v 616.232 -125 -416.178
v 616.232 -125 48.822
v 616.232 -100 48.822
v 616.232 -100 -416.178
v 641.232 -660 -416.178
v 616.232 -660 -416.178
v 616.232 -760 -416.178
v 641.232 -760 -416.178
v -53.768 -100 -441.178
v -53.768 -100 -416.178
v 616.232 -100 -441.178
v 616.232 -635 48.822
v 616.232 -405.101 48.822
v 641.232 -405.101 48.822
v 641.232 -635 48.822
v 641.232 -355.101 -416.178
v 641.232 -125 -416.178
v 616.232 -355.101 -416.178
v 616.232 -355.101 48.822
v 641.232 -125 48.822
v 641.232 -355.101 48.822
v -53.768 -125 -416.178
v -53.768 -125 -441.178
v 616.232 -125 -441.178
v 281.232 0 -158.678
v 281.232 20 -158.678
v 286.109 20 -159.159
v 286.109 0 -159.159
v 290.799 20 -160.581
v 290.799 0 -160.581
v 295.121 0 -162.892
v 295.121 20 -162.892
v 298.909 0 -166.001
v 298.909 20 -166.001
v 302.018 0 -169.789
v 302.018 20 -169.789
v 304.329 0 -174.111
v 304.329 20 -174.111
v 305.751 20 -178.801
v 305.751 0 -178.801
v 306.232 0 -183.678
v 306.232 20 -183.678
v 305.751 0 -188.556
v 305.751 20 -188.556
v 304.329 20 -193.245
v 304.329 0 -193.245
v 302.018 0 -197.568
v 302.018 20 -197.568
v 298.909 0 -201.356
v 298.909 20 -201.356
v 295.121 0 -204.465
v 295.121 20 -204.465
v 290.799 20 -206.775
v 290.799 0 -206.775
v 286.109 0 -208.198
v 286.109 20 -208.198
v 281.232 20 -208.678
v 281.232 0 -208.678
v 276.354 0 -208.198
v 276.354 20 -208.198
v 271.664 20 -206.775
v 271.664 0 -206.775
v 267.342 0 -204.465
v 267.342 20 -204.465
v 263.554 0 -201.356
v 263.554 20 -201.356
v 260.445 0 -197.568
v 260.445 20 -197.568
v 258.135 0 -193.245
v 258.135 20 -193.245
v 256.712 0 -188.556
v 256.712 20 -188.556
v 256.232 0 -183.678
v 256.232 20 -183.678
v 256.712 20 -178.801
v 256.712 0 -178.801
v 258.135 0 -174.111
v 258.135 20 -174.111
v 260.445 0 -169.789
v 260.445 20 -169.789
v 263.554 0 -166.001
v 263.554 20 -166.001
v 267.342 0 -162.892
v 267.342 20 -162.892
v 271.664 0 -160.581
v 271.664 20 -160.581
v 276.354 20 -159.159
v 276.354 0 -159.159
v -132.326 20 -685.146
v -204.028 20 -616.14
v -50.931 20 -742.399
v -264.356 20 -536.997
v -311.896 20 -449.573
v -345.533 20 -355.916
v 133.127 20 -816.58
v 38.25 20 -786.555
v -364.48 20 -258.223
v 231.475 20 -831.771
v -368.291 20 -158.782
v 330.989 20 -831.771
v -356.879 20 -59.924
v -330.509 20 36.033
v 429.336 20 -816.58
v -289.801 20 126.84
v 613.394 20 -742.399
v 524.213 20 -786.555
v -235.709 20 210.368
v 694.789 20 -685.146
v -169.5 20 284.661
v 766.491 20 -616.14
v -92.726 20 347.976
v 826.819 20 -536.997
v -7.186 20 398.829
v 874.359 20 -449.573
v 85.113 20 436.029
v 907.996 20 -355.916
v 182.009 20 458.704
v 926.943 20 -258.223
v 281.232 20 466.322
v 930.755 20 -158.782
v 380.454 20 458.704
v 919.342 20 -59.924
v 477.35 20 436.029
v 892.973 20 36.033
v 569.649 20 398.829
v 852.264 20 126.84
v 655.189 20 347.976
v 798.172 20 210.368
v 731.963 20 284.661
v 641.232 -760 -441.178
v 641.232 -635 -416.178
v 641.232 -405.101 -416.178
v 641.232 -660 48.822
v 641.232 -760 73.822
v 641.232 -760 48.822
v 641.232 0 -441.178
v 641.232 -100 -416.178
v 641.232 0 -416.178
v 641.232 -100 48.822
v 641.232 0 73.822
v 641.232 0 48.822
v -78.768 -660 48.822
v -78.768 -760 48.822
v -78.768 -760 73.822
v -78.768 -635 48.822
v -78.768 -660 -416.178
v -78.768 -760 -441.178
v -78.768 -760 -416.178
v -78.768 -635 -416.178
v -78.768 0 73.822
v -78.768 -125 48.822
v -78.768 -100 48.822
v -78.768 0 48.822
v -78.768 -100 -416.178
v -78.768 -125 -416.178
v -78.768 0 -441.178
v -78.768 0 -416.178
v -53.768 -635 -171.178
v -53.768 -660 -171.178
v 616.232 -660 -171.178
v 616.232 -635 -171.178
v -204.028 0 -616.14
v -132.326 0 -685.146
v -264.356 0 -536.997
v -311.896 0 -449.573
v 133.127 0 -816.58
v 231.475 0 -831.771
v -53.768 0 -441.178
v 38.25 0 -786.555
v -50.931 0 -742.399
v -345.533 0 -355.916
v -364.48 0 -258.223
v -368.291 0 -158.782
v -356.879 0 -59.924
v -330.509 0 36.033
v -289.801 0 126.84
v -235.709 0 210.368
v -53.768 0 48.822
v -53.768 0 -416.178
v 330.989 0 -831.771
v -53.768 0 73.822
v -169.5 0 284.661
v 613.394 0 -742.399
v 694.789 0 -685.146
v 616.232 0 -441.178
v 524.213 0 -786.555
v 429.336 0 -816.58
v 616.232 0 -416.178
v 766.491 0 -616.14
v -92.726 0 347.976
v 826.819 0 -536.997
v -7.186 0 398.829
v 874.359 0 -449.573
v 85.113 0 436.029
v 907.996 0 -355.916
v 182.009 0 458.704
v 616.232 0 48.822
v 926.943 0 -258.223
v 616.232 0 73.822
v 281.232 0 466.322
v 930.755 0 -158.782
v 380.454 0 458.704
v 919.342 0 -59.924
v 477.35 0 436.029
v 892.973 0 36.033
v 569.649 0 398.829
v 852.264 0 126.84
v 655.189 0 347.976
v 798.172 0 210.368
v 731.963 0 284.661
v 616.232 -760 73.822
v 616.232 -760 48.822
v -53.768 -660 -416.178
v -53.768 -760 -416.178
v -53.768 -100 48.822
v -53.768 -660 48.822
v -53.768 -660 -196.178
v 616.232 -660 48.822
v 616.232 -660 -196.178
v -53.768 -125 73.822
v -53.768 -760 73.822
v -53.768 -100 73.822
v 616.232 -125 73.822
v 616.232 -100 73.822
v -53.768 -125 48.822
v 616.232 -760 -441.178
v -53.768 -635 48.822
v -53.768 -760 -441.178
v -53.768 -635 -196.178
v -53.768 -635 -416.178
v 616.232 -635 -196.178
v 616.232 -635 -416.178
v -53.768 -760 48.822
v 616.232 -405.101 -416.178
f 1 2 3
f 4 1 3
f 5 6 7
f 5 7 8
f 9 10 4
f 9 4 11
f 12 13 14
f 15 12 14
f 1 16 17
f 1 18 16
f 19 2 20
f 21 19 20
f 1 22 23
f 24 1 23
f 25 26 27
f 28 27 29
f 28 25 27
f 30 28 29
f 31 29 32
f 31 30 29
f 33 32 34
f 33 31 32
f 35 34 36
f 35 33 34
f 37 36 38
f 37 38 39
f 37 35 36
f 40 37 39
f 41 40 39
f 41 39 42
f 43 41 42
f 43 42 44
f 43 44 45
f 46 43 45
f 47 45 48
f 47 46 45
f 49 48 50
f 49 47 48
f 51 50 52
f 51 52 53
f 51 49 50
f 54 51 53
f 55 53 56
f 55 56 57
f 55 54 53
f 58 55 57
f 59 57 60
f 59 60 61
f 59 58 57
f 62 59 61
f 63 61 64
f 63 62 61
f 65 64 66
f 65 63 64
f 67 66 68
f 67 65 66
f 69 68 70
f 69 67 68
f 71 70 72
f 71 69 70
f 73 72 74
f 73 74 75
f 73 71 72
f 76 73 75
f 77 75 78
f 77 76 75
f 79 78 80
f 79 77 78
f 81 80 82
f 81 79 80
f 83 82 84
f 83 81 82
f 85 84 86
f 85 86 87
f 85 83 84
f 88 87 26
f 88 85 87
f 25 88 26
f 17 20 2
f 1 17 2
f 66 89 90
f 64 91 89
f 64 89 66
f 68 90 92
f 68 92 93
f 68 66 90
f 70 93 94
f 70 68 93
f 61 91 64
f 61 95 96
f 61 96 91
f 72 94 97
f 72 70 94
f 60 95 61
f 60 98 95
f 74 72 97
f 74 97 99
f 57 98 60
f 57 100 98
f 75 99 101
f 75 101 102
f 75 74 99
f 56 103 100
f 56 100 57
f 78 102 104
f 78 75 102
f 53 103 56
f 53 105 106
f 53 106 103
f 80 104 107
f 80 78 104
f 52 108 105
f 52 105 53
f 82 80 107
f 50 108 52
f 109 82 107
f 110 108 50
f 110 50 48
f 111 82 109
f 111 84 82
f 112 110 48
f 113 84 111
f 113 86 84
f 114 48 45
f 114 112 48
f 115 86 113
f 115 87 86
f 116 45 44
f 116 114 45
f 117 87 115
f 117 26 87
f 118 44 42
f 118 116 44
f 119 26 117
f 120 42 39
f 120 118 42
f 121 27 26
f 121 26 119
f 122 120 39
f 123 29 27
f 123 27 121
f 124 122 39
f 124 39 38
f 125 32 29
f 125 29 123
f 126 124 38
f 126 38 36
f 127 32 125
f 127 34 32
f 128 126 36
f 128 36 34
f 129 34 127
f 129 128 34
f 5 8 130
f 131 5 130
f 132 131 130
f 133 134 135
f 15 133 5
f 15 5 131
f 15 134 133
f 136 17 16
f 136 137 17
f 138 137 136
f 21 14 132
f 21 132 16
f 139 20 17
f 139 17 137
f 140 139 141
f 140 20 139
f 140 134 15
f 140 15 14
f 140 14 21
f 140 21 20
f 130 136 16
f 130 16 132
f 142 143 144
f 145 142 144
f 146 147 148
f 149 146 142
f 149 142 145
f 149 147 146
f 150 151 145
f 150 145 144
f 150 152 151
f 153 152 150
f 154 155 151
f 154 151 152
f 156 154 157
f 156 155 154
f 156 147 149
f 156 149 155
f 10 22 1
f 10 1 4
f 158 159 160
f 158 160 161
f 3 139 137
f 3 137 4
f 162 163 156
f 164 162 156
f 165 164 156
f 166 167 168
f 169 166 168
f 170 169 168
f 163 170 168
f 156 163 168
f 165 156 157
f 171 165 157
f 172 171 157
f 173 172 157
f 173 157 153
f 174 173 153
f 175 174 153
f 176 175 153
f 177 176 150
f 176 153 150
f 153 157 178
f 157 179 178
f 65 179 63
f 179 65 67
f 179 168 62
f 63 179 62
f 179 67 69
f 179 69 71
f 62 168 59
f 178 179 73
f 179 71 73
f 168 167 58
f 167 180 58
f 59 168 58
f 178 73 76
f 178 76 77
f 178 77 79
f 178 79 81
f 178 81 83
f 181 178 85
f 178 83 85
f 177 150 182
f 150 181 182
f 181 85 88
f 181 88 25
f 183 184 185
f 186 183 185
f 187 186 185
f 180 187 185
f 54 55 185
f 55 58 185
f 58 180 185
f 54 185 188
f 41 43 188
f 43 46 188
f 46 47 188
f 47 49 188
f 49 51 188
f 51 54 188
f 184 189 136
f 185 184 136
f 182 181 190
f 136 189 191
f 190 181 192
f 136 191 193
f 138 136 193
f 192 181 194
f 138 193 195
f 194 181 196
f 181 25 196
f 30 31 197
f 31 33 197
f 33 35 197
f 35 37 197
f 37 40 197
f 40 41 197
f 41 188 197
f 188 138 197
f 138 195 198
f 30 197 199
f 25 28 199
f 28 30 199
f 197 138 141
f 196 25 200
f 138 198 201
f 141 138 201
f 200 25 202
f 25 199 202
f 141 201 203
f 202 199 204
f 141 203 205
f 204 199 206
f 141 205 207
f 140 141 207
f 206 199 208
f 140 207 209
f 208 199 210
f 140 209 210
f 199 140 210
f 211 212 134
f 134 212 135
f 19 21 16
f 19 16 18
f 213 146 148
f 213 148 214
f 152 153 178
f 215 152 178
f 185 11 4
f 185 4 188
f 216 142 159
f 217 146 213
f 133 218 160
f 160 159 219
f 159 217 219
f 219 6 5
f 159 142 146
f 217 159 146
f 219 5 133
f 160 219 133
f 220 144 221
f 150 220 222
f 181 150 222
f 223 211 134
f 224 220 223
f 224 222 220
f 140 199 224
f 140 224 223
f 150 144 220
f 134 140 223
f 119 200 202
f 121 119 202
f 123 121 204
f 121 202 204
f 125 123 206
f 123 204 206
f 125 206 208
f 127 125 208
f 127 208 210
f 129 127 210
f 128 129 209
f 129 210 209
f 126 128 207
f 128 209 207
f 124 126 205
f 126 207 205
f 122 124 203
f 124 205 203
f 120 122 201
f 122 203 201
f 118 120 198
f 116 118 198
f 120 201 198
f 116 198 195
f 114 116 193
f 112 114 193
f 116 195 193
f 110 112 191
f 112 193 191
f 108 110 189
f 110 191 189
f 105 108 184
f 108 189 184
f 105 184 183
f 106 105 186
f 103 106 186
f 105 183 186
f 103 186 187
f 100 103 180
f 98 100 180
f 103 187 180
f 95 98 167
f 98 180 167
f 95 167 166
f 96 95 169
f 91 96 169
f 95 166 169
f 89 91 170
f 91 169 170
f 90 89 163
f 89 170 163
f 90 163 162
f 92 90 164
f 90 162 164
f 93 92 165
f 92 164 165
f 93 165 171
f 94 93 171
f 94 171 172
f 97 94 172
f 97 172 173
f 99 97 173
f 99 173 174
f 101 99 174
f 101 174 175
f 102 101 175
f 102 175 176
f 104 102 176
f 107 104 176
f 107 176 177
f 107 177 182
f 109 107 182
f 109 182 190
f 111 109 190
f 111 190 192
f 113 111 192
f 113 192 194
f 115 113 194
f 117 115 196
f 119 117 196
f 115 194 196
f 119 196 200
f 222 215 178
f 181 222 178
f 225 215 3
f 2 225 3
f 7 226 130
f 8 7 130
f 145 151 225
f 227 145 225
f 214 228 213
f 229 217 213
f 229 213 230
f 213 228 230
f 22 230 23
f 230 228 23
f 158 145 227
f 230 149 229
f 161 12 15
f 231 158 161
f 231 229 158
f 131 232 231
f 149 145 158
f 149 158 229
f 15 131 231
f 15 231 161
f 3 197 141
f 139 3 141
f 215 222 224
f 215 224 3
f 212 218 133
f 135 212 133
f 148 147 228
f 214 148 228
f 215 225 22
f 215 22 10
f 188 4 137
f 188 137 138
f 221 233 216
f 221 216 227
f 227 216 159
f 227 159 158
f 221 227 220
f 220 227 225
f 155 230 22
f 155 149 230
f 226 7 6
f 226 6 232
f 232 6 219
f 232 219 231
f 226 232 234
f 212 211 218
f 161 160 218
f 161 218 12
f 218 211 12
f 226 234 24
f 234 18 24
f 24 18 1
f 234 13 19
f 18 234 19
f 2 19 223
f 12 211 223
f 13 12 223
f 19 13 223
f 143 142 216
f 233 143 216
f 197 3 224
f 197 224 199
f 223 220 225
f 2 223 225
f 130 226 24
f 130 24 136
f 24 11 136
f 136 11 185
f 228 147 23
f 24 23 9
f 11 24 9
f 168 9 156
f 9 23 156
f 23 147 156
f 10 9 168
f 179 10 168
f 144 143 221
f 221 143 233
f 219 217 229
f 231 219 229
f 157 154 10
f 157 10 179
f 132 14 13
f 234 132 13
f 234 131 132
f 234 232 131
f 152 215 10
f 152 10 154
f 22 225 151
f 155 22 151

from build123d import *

# Parameters (mm, degrees)
SKETCH2_W             = 25
SKETCH2_H             = 25
BOSS_EXTRUDE1_DEPTH   = 760
BOSS_EXTRUDE1_2_DEPTH = 760
BOSS_EXTRUDE1_3_DEPTH = 760
BOSS_EXTRUDE1_4_DEPTH = 760
SKETCH3_W             = 25
SKETCH3_H             = 25
BOSS_EXTRUDE2_DEPTH   = 470
SKETCH6_W             = 25
SKETCH6_H             = 25
BOSS_EXTRUDE4_DEPTH   = 675
SKETCH10_W            = 25
SKETCH10_H            = 25
BOSS_EXTRUDE5_DEPTH   = 470
SKETCH11_W            = 25
SKETCH11_H            = 50
BOSS_EXTRUDE6_DEPTH   = 470
SKETCH12_R            = 650
BOSS_EXTRUDE7_DEPTH   = 20
SKETCH13_R            = 25
CUT_EXTRUDE3_DEPTH    = 20


with BuildPart() as part:
    # Sketch2 → Boss-Extrude1 (new body)
    with BuildSketch(Plane(origin=(0, 0, 0), x_dir=(1, 0, 0), z_dir=(0, 1, 0))):
        with Locations((-66.268467475, 428.678343046)):
            Rectangle(SKETCH2_W, SKETCH2_H)
    extrude(amount=-BOSS_EXTRUDE1_DEPTH)



with BuildPart() as body_2:
    # Sketch2 → Boss-Extrude1 2 (new body)
    with BuildSketch(Plane(origin=(0, 0, 0), x_dir=(1, 0, 0), z_dir=(0, 1, 0))):
        with Locations((628.731532525, 428.678343046)):
            Rectangle(SKETCH2_W, SKETCH2_H)
    extrude(amount=-BOSS_EXTRUDE1_2_DEPTH)


with BuildPart() as body_3:
    # Sketch2 → Boss-Extrude1 3 (new body)
    with BuildSketch(Plane(origin=(0, 0, 0), x_dir=(1, 0, 0), z_dir=(0, 1, 0))):
        with Locations((628.731532525, -61.321656954)):
            Rectangle(SKETCH2_W, SKETCH2_H)
    extrude(amount=-BOSS_EXTRUDE1_3_DEPTH)


with BuildPart() as body_4:
    # Sketch2 → Boss-Extrude1 4 (new body)
    with BuildSketch(Plane(origin=(0, 0, 0), x_dir=(1, 0, 0), z_dir=(0, 1, 0))):
        with Locations((-66.268467475, -61.321656954)):
            Rectangle(SKETCH2_W, SKETCH2_H)
    extrude(amount=-BOSS_EXTRUDE1_4_DEPTH)


with BuildPart() as part_1:
    add(part.part)

    add(body_2.part)  # Boss-Extrude2 merges body 2

    add(body_3.part)  # Boss-Extrude2 merges body 3

    add(body_4.part)  # Boss-Extrude2 merges body 4
    # Sketch3 → Boss-Extrude2 (add)
    with BuildSketch(Plane.XY.offset(-416.178343046)):
        with Locations((-66.268467475, -647.5)):
            Rectangle(SKETCH3_W, SKETCH3_H)
        with Locations((628.731532525, -647.5)):
            Rectangle(SKETCH3_W, SKETCH3_H)
    extrude(amount=BOSS_EXTRUDE2_DEPTH)

    # Sketch6 → Boss-Extrude4 (add)
    with BuildSketch(Plane(origin=(-53.768467475, 0, 0), x_dir=(0, 0, -1), z_dir=(1, 0, 0))):
        with Locations((428.678343046, -112.5)):
            Rectangle(SKETCH6_W, SKETCH6_H)
        with Locations((183.678343046, -647.5)):
            Rectangle(SKETCH6_W, SKETCH6_H)
        with Locations((-61.321656954, -112.5)):
            Rectangle(SKETCH6_W, SKETCH6_H)
    extrude(amount=BOSS_EXTRUDE4_DEPTH)

    # Sketch10 → Boss-Extrude5 (add)
    with BuildSketch(Plane(origin=(0, 0, 48.821656954), x_dir=(-1, 0, 0), z_dir=(0, 0, -1))):
        with Locations((-628.731532525, -112.5)):
            Rectangle(SKETCH10_W, SKETCH10_H)
        with Locations((66.268467475, -112.5)):
            Rectangle(SKETCH10_W, SKETCH10_H)
    extrude(amount=BOSS_EXTRUDE5_DEPTH)

    # Sketch11 → Boss-Extrude6 (add)
    with BuildSketch(Plane(origin=(0, 0, 48.821656954), x_dir=(-1, 0, 0), z_dir=(0, 0, -1))):
        with Locations((-628.731532525, -380.100970917)):
            Rectangle(SKETCH11_W, SKETCH11_H)
    extrude(amount=BOSS_EXTRUDE6_DEPTH)

    # Sketch12 → Boss-Extrude7 (add)
    with BuildSketch(Plane(origin=(0, 0, 0), x_dir=(1, 0, 0), z_dir=(0, 1, 0))):
        with Locations(Location((281.231532525, 183.678343046, 0), (0, 0, 270))):
            Circle(SKETCH12_R)
    extrude(amount=BOSS_EXTRUDE7_DEPTH)

    # Sketch13 → Cut-Extrude3 (cut)
    with BuildSketch(Plane(origin=(0, 0, 0), x_dir=(1, 0, 0), z_dir=(0, 1, 0))):
        with Locations(Location((281.231532525, 183.678343046, 0), (0, 0, 270))):
            Circle(SKETCH13_R)
    extrude(amount=CUT_EXTRUDE3_DEPTH, mode=Mode.SUBTRACT)


solid = part_1.part
